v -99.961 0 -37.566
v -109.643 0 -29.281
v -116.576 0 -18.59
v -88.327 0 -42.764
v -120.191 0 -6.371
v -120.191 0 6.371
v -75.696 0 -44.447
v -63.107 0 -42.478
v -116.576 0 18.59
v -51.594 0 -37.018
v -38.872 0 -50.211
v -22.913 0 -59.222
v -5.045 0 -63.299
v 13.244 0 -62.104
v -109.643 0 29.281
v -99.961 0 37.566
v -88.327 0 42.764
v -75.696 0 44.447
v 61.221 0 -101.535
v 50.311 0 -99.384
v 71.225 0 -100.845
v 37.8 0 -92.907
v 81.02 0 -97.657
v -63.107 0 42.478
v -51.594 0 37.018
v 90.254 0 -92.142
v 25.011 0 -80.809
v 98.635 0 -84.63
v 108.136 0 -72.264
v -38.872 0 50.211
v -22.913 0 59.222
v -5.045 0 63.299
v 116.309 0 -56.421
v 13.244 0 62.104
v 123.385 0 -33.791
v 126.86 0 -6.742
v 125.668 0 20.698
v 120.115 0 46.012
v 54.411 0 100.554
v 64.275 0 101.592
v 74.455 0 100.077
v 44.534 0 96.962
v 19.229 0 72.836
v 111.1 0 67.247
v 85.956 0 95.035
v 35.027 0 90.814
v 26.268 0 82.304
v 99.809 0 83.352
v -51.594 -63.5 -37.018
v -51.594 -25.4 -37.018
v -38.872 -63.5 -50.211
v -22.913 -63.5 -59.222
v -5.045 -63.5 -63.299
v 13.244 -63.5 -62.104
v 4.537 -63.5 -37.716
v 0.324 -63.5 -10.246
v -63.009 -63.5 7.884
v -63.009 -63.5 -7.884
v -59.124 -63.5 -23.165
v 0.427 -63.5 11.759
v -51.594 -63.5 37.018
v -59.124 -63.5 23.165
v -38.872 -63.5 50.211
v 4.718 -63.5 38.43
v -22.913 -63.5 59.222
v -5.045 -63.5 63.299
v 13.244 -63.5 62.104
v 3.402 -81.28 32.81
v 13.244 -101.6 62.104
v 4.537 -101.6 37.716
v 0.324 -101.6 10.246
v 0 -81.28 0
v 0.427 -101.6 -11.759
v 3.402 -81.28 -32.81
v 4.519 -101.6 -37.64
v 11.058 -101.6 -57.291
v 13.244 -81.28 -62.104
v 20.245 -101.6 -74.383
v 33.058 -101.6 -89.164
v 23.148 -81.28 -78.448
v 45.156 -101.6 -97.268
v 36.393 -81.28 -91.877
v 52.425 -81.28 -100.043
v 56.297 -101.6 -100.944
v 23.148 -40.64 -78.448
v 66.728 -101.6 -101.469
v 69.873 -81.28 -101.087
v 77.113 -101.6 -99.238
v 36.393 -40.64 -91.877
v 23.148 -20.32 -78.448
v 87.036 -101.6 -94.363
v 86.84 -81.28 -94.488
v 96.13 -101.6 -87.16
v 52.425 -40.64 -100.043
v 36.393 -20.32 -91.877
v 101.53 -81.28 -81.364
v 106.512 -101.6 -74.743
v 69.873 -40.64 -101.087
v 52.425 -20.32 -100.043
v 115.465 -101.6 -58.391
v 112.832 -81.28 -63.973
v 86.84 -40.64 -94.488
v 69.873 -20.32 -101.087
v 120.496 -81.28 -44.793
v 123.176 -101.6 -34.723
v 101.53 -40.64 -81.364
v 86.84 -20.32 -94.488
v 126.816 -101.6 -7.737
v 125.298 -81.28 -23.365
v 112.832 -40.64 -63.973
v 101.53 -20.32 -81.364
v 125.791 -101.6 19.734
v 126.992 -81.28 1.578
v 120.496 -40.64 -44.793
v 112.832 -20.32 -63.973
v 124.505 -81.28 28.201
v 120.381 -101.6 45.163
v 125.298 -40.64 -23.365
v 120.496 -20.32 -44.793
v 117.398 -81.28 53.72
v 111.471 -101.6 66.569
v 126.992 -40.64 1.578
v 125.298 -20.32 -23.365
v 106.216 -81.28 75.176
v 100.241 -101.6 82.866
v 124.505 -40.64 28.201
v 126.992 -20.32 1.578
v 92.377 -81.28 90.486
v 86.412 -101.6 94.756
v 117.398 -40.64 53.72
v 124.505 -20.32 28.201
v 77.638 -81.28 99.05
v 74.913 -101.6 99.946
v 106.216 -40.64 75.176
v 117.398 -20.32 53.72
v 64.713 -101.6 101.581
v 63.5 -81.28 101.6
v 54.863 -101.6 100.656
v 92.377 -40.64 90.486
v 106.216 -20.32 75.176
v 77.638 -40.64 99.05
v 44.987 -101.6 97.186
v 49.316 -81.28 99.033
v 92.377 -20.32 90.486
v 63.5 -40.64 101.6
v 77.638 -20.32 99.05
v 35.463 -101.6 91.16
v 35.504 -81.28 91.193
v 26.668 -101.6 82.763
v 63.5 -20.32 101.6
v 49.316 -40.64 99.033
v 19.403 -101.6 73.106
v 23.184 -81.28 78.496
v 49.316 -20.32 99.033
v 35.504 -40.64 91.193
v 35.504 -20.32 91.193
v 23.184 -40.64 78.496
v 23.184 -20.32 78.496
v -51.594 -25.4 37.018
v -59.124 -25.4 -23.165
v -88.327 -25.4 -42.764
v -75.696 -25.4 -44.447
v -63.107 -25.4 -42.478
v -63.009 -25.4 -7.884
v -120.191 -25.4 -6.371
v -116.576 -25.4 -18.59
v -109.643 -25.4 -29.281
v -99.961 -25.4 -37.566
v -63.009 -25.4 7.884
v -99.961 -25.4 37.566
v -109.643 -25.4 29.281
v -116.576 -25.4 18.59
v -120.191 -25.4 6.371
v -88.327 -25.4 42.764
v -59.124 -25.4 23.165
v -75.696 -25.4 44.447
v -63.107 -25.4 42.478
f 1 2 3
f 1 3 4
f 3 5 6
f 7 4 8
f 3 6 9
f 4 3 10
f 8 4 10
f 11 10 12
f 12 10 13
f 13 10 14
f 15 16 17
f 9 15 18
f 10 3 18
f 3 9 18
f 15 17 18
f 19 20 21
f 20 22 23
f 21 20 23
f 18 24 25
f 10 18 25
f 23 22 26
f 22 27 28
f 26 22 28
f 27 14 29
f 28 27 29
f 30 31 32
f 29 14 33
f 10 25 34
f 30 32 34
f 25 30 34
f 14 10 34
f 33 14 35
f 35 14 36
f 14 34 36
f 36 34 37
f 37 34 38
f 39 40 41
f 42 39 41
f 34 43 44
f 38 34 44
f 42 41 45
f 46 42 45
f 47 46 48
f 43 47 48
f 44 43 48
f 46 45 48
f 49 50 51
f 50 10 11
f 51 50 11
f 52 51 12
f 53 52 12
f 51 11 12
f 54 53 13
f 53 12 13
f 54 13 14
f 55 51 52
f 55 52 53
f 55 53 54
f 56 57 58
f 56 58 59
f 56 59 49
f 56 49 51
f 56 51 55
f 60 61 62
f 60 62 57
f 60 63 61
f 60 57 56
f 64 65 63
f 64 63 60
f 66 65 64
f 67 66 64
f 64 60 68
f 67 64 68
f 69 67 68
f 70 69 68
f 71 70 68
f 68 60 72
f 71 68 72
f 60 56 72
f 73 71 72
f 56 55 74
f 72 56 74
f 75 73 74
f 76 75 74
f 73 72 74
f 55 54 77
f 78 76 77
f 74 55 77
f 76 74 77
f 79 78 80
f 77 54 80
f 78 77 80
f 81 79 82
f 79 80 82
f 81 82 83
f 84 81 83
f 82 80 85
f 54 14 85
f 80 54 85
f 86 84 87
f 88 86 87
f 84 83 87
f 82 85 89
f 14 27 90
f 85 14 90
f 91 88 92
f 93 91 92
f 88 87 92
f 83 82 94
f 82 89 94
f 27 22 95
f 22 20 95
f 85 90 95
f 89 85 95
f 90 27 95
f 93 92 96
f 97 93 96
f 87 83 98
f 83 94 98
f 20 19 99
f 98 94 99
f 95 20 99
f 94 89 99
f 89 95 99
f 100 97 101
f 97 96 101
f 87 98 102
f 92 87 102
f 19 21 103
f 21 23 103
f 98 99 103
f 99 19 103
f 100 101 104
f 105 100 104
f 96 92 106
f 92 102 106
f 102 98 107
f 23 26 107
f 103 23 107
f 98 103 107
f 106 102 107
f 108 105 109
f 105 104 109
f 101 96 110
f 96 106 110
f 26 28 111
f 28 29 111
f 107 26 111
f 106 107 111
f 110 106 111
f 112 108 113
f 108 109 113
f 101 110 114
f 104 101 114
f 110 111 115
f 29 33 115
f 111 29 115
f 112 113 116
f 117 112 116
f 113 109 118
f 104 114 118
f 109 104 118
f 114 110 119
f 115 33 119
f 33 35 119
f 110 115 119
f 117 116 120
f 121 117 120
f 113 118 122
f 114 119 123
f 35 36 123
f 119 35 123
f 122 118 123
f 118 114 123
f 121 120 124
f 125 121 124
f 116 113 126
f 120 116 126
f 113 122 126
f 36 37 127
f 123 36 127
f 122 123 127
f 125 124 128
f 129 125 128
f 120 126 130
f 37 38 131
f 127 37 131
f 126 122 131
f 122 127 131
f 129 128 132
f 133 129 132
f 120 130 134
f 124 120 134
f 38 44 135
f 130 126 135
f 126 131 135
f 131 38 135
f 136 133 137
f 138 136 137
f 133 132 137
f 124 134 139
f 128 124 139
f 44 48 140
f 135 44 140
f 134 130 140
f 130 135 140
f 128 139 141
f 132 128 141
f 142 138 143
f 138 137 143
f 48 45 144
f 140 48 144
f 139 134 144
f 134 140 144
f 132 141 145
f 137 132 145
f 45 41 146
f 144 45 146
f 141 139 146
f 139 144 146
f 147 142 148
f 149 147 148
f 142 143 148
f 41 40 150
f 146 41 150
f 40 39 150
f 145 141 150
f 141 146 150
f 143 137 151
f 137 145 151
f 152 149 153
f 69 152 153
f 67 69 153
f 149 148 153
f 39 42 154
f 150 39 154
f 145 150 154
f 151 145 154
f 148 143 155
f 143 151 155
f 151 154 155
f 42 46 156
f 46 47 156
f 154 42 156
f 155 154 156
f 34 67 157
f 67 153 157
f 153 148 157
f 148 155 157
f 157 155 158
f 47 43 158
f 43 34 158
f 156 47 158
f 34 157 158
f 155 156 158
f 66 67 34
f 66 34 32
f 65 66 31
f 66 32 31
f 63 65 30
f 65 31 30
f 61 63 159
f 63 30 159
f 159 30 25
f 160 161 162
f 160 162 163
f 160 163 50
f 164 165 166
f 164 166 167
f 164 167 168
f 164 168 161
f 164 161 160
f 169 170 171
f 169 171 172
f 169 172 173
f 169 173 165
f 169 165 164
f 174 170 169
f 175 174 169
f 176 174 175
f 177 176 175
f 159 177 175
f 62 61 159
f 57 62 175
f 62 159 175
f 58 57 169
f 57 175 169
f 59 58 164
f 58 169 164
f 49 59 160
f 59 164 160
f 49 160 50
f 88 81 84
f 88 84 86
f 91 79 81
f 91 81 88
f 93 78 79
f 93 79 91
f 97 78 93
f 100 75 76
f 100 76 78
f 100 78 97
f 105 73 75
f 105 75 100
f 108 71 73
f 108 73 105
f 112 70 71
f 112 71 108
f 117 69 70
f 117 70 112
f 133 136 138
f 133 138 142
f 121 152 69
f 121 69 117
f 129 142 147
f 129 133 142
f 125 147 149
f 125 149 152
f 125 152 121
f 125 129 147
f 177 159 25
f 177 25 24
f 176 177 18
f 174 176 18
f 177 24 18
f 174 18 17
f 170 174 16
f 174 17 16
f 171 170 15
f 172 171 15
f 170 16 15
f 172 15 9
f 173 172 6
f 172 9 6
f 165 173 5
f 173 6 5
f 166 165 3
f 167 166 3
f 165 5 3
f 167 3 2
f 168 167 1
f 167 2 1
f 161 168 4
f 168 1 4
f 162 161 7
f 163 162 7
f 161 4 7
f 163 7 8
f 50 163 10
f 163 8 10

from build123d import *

# Parameters (mm, degrees)
F1_DEPTH = 25.4
F2_DEPTH = 63.5
F3_DEPTH = 101.6


with BuildPart() as f1:
    # F0 (on Front) → F1 (new body)
    with BuildSketch(Plane.XZ):
        with BuildLine():
            ThreePointArc((-51.59375, -37.0180356169), (-60.4501990278, -19.4428248333), (-63.5, 0))
            ThreePointArc((-63.5, 0), (-60.4501990278, 19.4428248333), (-51.59375, 37.0180356169))
            ThreePointArc((-51.59375, 37.0180356169), (-120.65, 0), (-51.59375, -37.0180356169))
        make_face()
    extrude(amount=F1_DEPTH)

    # F0 (on Front) → F2 (join)
    with BuildSketch(Plane.XZ):
        with BuildLine():
            Line((-63.5, 0), (-31.75, 0))
            ThreePointArc((-31.75, 0), (-37.0237934934, 21.0006510316), (-51.59375, 37.0180356169))
            ThreePointArc((-51.59375, 37.0180356169), (-60.4501990278, 19.4428248333), (-63.5, 0))
        make_face()
        with BuildLine():
            ThreePointArc((-51.59375, -37.0180356169), (-37.0237934934, -21.0006510316), (-31.75, 0))
            Line((-31.75, 0), (-63.5, 0))
            ThreePointArc((-63.5, 0), (-60.4501990278, -19.4428248333), (-51.59375, -37.0180356169))
        make_face()
        with BuildLine():
            Line((-31.75, 0), (0, 0))
            add(Edge.make_bspline(
                [(13.2439655959, 62.1035214404), (0, 34.6669399309), (0, 0)],
                knots=[4.0547434617, 4.0547434617, 4.0547434617, 4.7123889804, 4.7123889804, 4.7123889804], degree=2, weights=[1, 0.9464231645, 1]))
            ThreePointArc((13.2439655959, 62.1035214404), (-22.9128106244, 59.2220660674), (-51.59375, 37.0180356169))
            ThreePointArc((-51.59375, 37.0180356169), (-37.0237934934, 21.0006510316), (-31.75, 0))
        make_face()
        with BuildLine():
            add(Edge.make_bspline(
                [(0, 0), (0, -34.6669399309), (13.2439655959, -62.1035214404)],
                knots=[4.7123889804, 4.7123889804, 4.7123889804, 5.370034499, 5.370034499, 5.370034499], degree=2, weights=[1, 0.9464231645, 1]))
            Line((0, 0), (-31.75, 0))
            ThreePointArc((-31.75, 0), (-37.0237934934, -21.0006510316), (-51.59375, -37.0180356169))
            ThreePointArc((-51.59375, -37.0180356169), (-22.9128106244, -59.2220660674), (13.2439655959, -62.1035214404))
        make_face()
    extrude(amount=F2_DEPTH)

    # F0 (on Front) → F3 (join)
    with BuildSketch(Plane.XZ):
        with BuildLine():
            add(Edge.make_bspline(
                [(13.2439655959, 62.1035214404), (0, 34.6669399309), (0, 0)],
                knots=[4.0547434617, 4.0547434617, 4.0547434617, 4.7123889804, 4.7123889804, 4.7123889804], degree=2, weights=[1, 0.9464231645, 1]))
            add(Edge.make_bspline(
                [(0, 0), (0, -34.6669399309), (13.2439655959, -62.1035214404)],
                knots=[4.7123889804, 4.7123889804, 4.7123889804, 5.370034499, 5.370034499, 5.370034499], degree=2, weights=[1, 0.9464231645, 1]))
            ThreePointArc((13.2439655959, -62.1035214404), (49.3621404284, -39.9453262889), (63.5, 0))
            ThreePointArc((63.5, 0), (49.3621404284, 39.9453262889), (13.2439655959, 62.1035214404))
        make_face()
        with BuildLine():
            ThreePointArc((63.5, 0), (49.3621404284, -39.9453262889), (13.2439655959, -62.1035214404))
            add(Edge.make_bspline(
                [(13.2439655959, -62.1035214404), (75.5537087854, -191.1861844445), (120.4955415237, -44.7930922222), (165.437374262, 101.6), (63.5, 101.6)],
                knots=[5.370034499, 5.370034499, 5.370034499, 7.3974062299, 7.3974062299, 9.4247779608, 9.4247779608, 9.4247779608], degree=2, weights=[1, 0.5287358074, 1, 0.5287358074, 1]))
            Line((63.5, 101.6), (63.5, 0))
        make_face()
        with BuildLine():
            add(Edge.make_bspline(
                [(63.5, 101.6), (32.3093875408, 101.6), (13.2439655959, 62.1035214404)],
                knots=[3.1415926536, 3.1415926536, 3.1415926536, 4.0547434617, 4.0547434617, 4.0547434617], degree=2, weights=[1, 0.8975675831, 1]))
            ThreePointArc((13.2439655959, 62.1035214404), (49.3621404284, 39.9453262889), (63.5, 0))
            Line((63.5, 0), (63.5, 101.6))
        make_face()
    extrude(amount=F3_DEPTH)


solid = f1.part
